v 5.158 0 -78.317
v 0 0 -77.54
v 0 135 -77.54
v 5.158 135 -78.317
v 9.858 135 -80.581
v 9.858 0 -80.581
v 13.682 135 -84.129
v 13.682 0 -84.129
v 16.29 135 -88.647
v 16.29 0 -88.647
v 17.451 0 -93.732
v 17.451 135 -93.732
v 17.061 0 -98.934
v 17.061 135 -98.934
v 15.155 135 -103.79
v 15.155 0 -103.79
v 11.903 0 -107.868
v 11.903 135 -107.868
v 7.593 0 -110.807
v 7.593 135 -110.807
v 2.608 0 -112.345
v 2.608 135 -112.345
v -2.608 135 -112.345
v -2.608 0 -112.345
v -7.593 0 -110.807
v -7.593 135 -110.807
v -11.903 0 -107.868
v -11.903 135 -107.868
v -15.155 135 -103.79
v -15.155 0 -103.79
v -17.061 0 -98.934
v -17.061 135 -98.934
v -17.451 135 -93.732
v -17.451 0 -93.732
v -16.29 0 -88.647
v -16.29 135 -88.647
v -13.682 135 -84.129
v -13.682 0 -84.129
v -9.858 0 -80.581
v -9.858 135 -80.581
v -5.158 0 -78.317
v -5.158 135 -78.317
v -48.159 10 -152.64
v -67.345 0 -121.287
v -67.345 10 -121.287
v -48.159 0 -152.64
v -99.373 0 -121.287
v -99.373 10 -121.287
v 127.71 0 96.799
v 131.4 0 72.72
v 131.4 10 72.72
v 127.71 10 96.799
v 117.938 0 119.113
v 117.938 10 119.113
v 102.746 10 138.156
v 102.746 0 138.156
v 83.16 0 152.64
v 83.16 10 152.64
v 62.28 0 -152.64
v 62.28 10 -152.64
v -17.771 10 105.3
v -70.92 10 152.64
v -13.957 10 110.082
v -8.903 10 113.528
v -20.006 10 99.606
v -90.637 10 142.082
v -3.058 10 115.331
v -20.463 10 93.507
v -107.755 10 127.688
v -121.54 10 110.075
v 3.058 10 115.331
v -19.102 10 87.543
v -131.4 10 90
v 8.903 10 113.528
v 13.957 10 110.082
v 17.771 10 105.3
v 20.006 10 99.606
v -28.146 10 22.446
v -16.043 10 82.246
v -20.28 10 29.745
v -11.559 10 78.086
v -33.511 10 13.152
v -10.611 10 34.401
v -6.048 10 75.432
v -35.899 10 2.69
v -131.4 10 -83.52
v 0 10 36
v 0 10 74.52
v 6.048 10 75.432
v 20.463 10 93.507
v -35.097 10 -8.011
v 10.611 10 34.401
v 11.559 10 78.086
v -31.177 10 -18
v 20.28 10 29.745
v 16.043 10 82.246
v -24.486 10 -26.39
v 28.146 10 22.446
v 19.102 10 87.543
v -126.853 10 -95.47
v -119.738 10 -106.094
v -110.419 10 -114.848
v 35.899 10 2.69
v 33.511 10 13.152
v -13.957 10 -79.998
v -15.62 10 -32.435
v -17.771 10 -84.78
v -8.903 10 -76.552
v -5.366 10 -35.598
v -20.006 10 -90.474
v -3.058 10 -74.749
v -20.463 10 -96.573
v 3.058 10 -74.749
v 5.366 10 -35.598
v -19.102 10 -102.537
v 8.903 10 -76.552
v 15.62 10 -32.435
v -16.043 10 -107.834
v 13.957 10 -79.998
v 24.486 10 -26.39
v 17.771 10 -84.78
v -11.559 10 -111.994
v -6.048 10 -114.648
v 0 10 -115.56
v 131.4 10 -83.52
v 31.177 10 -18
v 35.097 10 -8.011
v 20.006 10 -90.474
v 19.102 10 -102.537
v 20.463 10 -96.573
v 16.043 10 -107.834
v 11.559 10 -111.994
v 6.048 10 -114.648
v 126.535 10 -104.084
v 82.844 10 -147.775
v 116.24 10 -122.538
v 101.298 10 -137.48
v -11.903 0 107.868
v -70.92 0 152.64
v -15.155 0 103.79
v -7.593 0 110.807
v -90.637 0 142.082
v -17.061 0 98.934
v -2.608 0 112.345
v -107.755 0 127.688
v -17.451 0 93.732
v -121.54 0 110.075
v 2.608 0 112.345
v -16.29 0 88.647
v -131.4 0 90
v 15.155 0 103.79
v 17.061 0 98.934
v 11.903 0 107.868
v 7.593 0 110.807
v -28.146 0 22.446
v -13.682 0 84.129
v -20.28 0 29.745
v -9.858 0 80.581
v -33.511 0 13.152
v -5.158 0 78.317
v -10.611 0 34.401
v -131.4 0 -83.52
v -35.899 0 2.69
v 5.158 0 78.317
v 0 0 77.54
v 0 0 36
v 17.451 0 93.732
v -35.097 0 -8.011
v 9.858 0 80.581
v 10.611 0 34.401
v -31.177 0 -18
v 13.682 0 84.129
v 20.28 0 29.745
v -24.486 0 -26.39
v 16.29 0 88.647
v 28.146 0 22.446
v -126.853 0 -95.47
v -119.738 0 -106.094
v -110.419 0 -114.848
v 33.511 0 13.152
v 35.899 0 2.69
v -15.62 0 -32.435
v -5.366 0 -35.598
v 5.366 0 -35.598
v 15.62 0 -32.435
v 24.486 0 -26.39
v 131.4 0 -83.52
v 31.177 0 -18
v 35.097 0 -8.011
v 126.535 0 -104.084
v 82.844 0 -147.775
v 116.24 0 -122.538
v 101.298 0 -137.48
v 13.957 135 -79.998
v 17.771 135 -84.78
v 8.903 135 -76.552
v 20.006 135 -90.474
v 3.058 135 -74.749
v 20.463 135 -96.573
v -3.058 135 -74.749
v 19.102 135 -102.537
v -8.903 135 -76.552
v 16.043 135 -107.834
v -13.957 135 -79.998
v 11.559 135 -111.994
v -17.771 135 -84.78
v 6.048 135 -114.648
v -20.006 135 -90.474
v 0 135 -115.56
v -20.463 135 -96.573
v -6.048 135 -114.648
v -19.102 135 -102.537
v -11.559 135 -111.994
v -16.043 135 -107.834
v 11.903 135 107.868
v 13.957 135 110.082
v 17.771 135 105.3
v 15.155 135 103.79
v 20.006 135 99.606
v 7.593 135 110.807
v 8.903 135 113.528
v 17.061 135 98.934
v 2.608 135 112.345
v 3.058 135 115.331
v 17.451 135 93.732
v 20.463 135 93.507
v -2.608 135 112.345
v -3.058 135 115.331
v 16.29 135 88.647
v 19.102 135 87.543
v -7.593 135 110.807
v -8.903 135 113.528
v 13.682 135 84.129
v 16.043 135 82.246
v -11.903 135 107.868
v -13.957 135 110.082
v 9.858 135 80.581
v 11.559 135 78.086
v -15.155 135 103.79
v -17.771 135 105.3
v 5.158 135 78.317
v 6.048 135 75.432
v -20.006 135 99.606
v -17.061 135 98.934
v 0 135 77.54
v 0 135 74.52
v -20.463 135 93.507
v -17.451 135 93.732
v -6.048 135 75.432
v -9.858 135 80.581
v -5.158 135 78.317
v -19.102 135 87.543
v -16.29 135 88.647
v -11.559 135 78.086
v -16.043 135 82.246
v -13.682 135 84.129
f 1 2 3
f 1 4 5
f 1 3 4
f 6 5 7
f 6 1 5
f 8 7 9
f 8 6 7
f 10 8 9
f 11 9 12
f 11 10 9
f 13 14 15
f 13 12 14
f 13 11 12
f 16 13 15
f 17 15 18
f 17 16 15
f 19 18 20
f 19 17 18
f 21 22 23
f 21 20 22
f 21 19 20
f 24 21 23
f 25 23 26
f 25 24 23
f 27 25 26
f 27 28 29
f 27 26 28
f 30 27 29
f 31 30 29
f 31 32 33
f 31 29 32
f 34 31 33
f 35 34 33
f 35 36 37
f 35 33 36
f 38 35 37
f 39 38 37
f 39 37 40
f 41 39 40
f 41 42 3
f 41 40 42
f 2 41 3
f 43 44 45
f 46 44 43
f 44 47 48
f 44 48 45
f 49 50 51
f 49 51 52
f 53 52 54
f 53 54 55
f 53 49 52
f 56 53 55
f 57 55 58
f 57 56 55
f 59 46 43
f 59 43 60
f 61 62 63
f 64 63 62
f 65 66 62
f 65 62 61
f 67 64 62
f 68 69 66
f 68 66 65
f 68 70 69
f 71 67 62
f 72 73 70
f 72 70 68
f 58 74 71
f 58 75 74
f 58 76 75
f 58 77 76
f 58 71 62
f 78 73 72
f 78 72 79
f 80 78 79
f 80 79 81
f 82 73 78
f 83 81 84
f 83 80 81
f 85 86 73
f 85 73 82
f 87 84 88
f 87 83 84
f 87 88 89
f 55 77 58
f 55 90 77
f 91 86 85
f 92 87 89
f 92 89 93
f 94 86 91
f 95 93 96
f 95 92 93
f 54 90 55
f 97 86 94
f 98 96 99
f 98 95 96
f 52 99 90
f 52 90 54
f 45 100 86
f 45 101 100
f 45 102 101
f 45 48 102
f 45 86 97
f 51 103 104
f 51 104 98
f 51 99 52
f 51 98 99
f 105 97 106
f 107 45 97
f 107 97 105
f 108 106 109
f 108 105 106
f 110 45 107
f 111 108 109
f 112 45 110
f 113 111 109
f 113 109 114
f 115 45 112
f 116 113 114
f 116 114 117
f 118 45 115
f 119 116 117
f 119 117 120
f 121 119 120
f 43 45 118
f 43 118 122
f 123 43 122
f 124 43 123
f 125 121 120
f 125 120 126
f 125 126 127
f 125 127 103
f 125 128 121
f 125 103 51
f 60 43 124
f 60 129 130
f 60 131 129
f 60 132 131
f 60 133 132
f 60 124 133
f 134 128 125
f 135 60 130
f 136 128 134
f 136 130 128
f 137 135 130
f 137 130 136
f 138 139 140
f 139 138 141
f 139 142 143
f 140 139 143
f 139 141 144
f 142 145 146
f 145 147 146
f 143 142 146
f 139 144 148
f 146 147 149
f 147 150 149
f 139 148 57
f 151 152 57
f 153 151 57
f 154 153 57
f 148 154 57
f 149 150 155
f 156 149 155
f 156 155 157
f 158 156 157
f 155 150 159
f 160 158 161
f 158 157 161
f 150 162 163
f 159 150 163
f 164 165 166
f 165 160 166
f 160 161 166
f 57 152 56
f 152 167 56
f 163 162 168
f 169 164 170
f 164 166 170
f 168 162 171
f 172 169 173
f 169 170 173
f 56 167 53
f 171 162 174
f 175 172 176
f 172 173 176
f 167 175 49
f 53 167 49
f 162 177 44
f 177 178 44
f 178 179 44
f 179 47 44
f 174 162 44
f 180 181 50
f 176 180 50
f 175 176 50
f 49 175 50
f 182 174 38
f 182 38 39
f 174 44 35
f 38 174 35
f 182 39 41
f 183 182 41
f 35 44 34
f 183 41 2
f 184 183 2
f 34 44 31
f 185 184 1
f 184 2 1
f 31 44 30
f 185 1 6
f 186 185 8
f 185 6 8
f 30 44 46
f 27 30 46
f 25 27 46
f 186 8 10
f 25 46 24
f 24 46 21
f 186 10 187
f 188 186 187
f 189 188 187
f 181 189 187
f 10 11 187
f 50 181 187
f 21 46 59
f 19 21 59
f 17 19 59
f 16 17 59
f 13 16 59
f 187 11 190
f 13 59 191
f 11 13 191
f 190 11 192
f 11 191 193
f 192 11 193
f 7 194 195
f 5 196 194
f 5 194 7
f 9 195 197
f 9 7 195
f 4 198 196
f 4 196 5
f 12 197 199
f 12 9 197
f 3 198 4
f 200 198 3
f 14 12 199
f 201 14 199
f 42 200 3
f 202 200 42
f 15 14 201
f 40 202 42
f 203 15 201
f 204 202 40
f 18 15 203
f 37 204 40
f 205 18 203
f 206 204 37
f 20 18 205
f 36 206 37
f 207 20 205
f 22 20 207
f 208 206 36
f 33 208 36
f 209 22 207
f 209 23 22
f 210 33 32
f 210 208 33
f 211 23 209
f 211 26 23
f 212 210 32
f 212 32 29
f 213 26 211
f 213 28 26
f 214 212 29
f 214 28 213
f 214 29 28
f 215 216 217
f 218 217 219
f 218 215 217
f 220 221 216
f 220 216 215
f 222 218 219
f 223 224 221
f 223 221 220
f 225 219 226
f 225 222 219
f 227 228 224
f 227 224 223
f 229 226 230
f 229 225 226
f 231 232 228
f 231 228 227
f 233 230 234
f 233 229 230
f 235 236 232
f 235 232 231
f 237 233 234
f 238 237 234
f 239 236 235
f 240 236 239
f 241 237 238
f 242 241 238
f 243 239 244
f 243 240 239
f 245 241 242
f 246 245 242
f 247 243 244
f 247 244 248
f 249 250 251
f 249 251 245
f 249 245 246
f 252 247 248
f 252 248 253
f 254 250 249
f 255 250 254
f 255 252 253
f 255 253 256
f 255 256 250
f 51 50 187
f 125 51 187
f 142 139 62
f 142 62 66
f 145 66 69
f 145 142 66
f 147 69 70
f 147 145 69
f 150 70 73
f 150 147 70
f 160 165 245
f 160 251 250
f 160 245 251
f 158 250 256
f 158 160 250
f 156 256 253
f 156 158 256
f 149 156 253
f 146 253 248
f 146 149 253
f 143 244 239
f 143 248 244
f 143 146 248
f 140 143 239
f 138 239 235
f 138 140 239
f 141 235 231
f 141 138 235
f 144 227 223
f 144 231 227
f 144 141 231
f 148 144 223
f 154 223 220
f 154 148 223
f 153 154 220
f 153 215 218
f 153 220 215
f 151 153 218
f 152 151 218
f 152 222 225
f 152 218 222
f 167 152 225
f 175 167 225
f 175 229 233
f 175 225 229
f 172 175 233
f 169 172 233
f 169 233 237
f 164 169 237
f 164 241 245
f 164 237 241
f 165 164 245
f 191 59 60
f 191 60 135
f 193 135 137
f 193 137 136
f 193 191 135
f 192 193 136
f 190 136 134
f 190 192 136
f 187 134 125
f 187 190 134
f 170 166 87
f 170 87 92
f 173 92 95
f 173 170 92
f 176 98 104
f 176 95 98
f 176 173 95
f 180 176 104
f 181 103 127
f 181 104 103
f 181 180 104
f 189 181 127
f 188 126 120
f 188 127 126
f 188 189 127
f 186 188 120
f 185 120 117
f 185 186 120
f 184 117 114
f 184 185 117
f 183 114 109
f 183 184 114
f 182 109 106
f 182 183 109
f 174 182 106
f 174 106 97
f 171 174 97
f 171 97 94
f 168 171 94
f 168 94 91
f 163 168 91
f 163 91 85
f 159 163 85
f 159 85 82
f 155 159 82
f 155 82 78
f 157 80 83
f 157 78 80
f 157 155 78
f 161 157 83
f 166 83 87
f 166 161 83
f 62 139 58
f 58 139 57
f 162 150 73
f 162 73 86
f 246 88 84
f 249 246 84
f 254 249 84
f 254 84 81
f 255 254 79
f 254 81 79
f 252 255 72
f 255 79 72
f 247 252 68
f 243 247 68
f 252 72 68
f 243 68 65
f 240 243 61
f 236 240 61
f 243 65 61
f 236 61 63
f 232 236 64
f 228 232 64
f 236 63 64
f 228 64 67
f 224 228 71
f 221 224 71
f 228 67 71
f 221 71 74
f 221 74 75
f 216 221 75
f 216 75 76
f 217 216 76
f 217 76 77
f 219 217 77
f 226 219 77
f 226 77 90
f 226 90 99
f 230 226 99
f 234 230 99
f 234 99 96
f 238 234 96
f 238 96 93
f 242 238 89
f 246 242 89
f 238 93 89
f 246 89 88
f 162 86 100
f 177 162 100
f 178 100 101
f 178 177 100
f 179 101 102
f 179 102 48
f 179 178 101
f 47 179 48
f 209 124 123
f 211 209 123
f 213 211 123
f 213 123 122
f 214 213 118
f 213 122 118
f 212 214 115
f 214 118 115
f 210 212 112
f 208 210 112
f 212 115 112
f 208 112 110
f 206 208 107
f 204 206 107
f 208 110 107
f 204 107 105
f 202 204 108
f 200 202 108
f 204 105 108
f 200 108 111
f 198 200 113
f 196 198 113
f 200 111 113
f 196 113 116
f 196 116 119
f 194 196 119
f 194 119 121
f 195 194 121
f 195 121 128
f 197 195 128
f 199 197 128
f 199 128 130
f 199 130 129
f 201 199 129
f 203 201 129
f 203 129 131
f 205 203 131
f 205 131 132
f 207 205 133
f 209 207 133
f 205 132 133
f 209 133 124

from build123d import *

# Parameters (mm, degrees)
SKETCH3_W               = 262.8
SKETCH3_H               = 305.28
BOSS_EXTRUDE3_DEPTH     = 10
CUT_EXTRUDE1_DEPTH      = 202.655472527
CUT_EXTRUDE1_DEPTH_BACK = 202.655472527
CUT_EXTRUDE2_DEPTH      = 202.655472527
CUT_EXTRUDE2_DEPTH_BACK = 202.655472527
SKETCH5_R               = 36
SKETCH6_R               = 20.52
BOSS_EXTRUDE4_DEPTH     = 125
CUT_EXTRUDE3_DEPTH      = 243.466347356
CUT_EXTRUDE3_DEPTH_BACK = 243.466347356
SKETCH7_R               = 17.5


with BuildPart() as part:
    # Sketch3 → Boss-Extrude3 (new body)
    with BuildSketch(Plane(origin=(0, 0, 0), x_dir=(1, 0, 0), z_dir=(0, 1, 0))):
        Rectangle(SKETCH3_W, SKETCH3_H)
    extrude(amount=BOSS_EXTRUDE3_DEPTH)

    # Sketch4 → Cut-Extrude1 (cut, two sides: drawn at the far end of the back side and taken through both)
    with BuildSketch(Plane(origin=(0, 10, 0), x_dir=(1, 0, 0), z_dir=(0, 1, 0)).offset(-CUT_EXTRUDE1_DEPTH_BACK)):
        with BuildLine():
            Line((-131.4, -90), (-131.4, -152.64))
            Line((-131.4, -152.64), (-70.92, -152.64))
            ThreePointArc((-70.92, -152.64), (-107.755247271, -127.687824951), (-131.4, -90))
        make_face()
        with BuildLine():
            Line((83.16, -152.64), (131.4, -152.64))
            Line((131.4, -152.64), (131.4, -72.72))
            ThreePointArc((131.4, -72.72), (117.938305095, -119.113391364), (83.16, -152.64))
        make_face()
        with BuildLine():
            Line((-99.372734155, 121.287125755), (-67.345468311, 121.287125755))
            Line((-67.345468311, 121.287125755), (-48.15934209, 152.64))
            Line((-48.15934209, 152.64), (-131.4, 152.64))
            Line((-131.4, 152.64), (-131.4, 83.52))
            ThreePointArc((-131.4, 83.52), (-119.737831056, 106.093689962), (-99.372734155, 121.287125755))
        make_face()
        with BuildLine():
            Line((131.4, 83.52), (131.4, 152.64))
            Line((131.4, 152.64), (62.28, 152.64))
            ThreePointArc((62.28, 152.64), (109.286007047, 130.526007047), (131.4, 83.52))
        make_face()
    extrude(amount=CUT_EXTRUDE1_DEPTH + CUT_EXTRUDE1_DEPTH_BACK, mode=Mode.SUBTRACT)

    # Sketch5 → Cut-Extrude2 (cut, two sides: drawn at the far end of the back side and taken through both)
    with BuildSketch(Plane(origin=(0, 10, 0), x_dir=(1, 0, 0), z_dir=(0, 1, 0)).offset(-CUT_EXTRUDE2_DEPTH_BACK)):
        with Locations(Location((0, 0, 0), (0, 0, 270))):
            Circle(SKETCH5_R)
    extrude(amount=CUT_EXTRUDE2_DEPTH + CUT_EXTRUDE2_DEPTH_BACK, mode=Mode.SUBTRACT)

    # Sketch6 → Boss-Extrude4 (add)
    with BuildSketch(Plane(origin=(0, 10, 0), x_dir=(1, 0, 0), z_dir=(0, 1, 0))):
        with Locations(Location((0, 95.04, 0), (0, 0, 90))):
            Circle(SKETCH6_R)
        with Locations(Location((0, -95.04, 0), (0, 0, 90))):
            Circle(SKETCH6_R)
    extrude(amount=BOSS_EXTRUDE4_DEPTH)

    # Sketch7 → Cut-Extrude3 (cut, two sides: drawn at the far end of the back side and taken through both)
    with BuildSketch(Plane(origin=(0, 135, 0), x_dir=(1, 0, 0), z_dir=(0, 1, 0)).offset(-CUT_EXTRUDE3_DEPTH_BACK)):
        with Locations(Location((0, 95.04, 0), (0, 0, 270))):
            Circle(SKETCH7_R)
        with Locations(Location((0, -95.04, 0), (0, 0, 90))):
            Circle(SKETCH7_R)
    extrude(amount=CUT_EXTRUDE3_DEPTH + CUT_EXTRUDE3_DEPTH_BACK, mode=Mode.SUBTRACT)


solid = part.part
